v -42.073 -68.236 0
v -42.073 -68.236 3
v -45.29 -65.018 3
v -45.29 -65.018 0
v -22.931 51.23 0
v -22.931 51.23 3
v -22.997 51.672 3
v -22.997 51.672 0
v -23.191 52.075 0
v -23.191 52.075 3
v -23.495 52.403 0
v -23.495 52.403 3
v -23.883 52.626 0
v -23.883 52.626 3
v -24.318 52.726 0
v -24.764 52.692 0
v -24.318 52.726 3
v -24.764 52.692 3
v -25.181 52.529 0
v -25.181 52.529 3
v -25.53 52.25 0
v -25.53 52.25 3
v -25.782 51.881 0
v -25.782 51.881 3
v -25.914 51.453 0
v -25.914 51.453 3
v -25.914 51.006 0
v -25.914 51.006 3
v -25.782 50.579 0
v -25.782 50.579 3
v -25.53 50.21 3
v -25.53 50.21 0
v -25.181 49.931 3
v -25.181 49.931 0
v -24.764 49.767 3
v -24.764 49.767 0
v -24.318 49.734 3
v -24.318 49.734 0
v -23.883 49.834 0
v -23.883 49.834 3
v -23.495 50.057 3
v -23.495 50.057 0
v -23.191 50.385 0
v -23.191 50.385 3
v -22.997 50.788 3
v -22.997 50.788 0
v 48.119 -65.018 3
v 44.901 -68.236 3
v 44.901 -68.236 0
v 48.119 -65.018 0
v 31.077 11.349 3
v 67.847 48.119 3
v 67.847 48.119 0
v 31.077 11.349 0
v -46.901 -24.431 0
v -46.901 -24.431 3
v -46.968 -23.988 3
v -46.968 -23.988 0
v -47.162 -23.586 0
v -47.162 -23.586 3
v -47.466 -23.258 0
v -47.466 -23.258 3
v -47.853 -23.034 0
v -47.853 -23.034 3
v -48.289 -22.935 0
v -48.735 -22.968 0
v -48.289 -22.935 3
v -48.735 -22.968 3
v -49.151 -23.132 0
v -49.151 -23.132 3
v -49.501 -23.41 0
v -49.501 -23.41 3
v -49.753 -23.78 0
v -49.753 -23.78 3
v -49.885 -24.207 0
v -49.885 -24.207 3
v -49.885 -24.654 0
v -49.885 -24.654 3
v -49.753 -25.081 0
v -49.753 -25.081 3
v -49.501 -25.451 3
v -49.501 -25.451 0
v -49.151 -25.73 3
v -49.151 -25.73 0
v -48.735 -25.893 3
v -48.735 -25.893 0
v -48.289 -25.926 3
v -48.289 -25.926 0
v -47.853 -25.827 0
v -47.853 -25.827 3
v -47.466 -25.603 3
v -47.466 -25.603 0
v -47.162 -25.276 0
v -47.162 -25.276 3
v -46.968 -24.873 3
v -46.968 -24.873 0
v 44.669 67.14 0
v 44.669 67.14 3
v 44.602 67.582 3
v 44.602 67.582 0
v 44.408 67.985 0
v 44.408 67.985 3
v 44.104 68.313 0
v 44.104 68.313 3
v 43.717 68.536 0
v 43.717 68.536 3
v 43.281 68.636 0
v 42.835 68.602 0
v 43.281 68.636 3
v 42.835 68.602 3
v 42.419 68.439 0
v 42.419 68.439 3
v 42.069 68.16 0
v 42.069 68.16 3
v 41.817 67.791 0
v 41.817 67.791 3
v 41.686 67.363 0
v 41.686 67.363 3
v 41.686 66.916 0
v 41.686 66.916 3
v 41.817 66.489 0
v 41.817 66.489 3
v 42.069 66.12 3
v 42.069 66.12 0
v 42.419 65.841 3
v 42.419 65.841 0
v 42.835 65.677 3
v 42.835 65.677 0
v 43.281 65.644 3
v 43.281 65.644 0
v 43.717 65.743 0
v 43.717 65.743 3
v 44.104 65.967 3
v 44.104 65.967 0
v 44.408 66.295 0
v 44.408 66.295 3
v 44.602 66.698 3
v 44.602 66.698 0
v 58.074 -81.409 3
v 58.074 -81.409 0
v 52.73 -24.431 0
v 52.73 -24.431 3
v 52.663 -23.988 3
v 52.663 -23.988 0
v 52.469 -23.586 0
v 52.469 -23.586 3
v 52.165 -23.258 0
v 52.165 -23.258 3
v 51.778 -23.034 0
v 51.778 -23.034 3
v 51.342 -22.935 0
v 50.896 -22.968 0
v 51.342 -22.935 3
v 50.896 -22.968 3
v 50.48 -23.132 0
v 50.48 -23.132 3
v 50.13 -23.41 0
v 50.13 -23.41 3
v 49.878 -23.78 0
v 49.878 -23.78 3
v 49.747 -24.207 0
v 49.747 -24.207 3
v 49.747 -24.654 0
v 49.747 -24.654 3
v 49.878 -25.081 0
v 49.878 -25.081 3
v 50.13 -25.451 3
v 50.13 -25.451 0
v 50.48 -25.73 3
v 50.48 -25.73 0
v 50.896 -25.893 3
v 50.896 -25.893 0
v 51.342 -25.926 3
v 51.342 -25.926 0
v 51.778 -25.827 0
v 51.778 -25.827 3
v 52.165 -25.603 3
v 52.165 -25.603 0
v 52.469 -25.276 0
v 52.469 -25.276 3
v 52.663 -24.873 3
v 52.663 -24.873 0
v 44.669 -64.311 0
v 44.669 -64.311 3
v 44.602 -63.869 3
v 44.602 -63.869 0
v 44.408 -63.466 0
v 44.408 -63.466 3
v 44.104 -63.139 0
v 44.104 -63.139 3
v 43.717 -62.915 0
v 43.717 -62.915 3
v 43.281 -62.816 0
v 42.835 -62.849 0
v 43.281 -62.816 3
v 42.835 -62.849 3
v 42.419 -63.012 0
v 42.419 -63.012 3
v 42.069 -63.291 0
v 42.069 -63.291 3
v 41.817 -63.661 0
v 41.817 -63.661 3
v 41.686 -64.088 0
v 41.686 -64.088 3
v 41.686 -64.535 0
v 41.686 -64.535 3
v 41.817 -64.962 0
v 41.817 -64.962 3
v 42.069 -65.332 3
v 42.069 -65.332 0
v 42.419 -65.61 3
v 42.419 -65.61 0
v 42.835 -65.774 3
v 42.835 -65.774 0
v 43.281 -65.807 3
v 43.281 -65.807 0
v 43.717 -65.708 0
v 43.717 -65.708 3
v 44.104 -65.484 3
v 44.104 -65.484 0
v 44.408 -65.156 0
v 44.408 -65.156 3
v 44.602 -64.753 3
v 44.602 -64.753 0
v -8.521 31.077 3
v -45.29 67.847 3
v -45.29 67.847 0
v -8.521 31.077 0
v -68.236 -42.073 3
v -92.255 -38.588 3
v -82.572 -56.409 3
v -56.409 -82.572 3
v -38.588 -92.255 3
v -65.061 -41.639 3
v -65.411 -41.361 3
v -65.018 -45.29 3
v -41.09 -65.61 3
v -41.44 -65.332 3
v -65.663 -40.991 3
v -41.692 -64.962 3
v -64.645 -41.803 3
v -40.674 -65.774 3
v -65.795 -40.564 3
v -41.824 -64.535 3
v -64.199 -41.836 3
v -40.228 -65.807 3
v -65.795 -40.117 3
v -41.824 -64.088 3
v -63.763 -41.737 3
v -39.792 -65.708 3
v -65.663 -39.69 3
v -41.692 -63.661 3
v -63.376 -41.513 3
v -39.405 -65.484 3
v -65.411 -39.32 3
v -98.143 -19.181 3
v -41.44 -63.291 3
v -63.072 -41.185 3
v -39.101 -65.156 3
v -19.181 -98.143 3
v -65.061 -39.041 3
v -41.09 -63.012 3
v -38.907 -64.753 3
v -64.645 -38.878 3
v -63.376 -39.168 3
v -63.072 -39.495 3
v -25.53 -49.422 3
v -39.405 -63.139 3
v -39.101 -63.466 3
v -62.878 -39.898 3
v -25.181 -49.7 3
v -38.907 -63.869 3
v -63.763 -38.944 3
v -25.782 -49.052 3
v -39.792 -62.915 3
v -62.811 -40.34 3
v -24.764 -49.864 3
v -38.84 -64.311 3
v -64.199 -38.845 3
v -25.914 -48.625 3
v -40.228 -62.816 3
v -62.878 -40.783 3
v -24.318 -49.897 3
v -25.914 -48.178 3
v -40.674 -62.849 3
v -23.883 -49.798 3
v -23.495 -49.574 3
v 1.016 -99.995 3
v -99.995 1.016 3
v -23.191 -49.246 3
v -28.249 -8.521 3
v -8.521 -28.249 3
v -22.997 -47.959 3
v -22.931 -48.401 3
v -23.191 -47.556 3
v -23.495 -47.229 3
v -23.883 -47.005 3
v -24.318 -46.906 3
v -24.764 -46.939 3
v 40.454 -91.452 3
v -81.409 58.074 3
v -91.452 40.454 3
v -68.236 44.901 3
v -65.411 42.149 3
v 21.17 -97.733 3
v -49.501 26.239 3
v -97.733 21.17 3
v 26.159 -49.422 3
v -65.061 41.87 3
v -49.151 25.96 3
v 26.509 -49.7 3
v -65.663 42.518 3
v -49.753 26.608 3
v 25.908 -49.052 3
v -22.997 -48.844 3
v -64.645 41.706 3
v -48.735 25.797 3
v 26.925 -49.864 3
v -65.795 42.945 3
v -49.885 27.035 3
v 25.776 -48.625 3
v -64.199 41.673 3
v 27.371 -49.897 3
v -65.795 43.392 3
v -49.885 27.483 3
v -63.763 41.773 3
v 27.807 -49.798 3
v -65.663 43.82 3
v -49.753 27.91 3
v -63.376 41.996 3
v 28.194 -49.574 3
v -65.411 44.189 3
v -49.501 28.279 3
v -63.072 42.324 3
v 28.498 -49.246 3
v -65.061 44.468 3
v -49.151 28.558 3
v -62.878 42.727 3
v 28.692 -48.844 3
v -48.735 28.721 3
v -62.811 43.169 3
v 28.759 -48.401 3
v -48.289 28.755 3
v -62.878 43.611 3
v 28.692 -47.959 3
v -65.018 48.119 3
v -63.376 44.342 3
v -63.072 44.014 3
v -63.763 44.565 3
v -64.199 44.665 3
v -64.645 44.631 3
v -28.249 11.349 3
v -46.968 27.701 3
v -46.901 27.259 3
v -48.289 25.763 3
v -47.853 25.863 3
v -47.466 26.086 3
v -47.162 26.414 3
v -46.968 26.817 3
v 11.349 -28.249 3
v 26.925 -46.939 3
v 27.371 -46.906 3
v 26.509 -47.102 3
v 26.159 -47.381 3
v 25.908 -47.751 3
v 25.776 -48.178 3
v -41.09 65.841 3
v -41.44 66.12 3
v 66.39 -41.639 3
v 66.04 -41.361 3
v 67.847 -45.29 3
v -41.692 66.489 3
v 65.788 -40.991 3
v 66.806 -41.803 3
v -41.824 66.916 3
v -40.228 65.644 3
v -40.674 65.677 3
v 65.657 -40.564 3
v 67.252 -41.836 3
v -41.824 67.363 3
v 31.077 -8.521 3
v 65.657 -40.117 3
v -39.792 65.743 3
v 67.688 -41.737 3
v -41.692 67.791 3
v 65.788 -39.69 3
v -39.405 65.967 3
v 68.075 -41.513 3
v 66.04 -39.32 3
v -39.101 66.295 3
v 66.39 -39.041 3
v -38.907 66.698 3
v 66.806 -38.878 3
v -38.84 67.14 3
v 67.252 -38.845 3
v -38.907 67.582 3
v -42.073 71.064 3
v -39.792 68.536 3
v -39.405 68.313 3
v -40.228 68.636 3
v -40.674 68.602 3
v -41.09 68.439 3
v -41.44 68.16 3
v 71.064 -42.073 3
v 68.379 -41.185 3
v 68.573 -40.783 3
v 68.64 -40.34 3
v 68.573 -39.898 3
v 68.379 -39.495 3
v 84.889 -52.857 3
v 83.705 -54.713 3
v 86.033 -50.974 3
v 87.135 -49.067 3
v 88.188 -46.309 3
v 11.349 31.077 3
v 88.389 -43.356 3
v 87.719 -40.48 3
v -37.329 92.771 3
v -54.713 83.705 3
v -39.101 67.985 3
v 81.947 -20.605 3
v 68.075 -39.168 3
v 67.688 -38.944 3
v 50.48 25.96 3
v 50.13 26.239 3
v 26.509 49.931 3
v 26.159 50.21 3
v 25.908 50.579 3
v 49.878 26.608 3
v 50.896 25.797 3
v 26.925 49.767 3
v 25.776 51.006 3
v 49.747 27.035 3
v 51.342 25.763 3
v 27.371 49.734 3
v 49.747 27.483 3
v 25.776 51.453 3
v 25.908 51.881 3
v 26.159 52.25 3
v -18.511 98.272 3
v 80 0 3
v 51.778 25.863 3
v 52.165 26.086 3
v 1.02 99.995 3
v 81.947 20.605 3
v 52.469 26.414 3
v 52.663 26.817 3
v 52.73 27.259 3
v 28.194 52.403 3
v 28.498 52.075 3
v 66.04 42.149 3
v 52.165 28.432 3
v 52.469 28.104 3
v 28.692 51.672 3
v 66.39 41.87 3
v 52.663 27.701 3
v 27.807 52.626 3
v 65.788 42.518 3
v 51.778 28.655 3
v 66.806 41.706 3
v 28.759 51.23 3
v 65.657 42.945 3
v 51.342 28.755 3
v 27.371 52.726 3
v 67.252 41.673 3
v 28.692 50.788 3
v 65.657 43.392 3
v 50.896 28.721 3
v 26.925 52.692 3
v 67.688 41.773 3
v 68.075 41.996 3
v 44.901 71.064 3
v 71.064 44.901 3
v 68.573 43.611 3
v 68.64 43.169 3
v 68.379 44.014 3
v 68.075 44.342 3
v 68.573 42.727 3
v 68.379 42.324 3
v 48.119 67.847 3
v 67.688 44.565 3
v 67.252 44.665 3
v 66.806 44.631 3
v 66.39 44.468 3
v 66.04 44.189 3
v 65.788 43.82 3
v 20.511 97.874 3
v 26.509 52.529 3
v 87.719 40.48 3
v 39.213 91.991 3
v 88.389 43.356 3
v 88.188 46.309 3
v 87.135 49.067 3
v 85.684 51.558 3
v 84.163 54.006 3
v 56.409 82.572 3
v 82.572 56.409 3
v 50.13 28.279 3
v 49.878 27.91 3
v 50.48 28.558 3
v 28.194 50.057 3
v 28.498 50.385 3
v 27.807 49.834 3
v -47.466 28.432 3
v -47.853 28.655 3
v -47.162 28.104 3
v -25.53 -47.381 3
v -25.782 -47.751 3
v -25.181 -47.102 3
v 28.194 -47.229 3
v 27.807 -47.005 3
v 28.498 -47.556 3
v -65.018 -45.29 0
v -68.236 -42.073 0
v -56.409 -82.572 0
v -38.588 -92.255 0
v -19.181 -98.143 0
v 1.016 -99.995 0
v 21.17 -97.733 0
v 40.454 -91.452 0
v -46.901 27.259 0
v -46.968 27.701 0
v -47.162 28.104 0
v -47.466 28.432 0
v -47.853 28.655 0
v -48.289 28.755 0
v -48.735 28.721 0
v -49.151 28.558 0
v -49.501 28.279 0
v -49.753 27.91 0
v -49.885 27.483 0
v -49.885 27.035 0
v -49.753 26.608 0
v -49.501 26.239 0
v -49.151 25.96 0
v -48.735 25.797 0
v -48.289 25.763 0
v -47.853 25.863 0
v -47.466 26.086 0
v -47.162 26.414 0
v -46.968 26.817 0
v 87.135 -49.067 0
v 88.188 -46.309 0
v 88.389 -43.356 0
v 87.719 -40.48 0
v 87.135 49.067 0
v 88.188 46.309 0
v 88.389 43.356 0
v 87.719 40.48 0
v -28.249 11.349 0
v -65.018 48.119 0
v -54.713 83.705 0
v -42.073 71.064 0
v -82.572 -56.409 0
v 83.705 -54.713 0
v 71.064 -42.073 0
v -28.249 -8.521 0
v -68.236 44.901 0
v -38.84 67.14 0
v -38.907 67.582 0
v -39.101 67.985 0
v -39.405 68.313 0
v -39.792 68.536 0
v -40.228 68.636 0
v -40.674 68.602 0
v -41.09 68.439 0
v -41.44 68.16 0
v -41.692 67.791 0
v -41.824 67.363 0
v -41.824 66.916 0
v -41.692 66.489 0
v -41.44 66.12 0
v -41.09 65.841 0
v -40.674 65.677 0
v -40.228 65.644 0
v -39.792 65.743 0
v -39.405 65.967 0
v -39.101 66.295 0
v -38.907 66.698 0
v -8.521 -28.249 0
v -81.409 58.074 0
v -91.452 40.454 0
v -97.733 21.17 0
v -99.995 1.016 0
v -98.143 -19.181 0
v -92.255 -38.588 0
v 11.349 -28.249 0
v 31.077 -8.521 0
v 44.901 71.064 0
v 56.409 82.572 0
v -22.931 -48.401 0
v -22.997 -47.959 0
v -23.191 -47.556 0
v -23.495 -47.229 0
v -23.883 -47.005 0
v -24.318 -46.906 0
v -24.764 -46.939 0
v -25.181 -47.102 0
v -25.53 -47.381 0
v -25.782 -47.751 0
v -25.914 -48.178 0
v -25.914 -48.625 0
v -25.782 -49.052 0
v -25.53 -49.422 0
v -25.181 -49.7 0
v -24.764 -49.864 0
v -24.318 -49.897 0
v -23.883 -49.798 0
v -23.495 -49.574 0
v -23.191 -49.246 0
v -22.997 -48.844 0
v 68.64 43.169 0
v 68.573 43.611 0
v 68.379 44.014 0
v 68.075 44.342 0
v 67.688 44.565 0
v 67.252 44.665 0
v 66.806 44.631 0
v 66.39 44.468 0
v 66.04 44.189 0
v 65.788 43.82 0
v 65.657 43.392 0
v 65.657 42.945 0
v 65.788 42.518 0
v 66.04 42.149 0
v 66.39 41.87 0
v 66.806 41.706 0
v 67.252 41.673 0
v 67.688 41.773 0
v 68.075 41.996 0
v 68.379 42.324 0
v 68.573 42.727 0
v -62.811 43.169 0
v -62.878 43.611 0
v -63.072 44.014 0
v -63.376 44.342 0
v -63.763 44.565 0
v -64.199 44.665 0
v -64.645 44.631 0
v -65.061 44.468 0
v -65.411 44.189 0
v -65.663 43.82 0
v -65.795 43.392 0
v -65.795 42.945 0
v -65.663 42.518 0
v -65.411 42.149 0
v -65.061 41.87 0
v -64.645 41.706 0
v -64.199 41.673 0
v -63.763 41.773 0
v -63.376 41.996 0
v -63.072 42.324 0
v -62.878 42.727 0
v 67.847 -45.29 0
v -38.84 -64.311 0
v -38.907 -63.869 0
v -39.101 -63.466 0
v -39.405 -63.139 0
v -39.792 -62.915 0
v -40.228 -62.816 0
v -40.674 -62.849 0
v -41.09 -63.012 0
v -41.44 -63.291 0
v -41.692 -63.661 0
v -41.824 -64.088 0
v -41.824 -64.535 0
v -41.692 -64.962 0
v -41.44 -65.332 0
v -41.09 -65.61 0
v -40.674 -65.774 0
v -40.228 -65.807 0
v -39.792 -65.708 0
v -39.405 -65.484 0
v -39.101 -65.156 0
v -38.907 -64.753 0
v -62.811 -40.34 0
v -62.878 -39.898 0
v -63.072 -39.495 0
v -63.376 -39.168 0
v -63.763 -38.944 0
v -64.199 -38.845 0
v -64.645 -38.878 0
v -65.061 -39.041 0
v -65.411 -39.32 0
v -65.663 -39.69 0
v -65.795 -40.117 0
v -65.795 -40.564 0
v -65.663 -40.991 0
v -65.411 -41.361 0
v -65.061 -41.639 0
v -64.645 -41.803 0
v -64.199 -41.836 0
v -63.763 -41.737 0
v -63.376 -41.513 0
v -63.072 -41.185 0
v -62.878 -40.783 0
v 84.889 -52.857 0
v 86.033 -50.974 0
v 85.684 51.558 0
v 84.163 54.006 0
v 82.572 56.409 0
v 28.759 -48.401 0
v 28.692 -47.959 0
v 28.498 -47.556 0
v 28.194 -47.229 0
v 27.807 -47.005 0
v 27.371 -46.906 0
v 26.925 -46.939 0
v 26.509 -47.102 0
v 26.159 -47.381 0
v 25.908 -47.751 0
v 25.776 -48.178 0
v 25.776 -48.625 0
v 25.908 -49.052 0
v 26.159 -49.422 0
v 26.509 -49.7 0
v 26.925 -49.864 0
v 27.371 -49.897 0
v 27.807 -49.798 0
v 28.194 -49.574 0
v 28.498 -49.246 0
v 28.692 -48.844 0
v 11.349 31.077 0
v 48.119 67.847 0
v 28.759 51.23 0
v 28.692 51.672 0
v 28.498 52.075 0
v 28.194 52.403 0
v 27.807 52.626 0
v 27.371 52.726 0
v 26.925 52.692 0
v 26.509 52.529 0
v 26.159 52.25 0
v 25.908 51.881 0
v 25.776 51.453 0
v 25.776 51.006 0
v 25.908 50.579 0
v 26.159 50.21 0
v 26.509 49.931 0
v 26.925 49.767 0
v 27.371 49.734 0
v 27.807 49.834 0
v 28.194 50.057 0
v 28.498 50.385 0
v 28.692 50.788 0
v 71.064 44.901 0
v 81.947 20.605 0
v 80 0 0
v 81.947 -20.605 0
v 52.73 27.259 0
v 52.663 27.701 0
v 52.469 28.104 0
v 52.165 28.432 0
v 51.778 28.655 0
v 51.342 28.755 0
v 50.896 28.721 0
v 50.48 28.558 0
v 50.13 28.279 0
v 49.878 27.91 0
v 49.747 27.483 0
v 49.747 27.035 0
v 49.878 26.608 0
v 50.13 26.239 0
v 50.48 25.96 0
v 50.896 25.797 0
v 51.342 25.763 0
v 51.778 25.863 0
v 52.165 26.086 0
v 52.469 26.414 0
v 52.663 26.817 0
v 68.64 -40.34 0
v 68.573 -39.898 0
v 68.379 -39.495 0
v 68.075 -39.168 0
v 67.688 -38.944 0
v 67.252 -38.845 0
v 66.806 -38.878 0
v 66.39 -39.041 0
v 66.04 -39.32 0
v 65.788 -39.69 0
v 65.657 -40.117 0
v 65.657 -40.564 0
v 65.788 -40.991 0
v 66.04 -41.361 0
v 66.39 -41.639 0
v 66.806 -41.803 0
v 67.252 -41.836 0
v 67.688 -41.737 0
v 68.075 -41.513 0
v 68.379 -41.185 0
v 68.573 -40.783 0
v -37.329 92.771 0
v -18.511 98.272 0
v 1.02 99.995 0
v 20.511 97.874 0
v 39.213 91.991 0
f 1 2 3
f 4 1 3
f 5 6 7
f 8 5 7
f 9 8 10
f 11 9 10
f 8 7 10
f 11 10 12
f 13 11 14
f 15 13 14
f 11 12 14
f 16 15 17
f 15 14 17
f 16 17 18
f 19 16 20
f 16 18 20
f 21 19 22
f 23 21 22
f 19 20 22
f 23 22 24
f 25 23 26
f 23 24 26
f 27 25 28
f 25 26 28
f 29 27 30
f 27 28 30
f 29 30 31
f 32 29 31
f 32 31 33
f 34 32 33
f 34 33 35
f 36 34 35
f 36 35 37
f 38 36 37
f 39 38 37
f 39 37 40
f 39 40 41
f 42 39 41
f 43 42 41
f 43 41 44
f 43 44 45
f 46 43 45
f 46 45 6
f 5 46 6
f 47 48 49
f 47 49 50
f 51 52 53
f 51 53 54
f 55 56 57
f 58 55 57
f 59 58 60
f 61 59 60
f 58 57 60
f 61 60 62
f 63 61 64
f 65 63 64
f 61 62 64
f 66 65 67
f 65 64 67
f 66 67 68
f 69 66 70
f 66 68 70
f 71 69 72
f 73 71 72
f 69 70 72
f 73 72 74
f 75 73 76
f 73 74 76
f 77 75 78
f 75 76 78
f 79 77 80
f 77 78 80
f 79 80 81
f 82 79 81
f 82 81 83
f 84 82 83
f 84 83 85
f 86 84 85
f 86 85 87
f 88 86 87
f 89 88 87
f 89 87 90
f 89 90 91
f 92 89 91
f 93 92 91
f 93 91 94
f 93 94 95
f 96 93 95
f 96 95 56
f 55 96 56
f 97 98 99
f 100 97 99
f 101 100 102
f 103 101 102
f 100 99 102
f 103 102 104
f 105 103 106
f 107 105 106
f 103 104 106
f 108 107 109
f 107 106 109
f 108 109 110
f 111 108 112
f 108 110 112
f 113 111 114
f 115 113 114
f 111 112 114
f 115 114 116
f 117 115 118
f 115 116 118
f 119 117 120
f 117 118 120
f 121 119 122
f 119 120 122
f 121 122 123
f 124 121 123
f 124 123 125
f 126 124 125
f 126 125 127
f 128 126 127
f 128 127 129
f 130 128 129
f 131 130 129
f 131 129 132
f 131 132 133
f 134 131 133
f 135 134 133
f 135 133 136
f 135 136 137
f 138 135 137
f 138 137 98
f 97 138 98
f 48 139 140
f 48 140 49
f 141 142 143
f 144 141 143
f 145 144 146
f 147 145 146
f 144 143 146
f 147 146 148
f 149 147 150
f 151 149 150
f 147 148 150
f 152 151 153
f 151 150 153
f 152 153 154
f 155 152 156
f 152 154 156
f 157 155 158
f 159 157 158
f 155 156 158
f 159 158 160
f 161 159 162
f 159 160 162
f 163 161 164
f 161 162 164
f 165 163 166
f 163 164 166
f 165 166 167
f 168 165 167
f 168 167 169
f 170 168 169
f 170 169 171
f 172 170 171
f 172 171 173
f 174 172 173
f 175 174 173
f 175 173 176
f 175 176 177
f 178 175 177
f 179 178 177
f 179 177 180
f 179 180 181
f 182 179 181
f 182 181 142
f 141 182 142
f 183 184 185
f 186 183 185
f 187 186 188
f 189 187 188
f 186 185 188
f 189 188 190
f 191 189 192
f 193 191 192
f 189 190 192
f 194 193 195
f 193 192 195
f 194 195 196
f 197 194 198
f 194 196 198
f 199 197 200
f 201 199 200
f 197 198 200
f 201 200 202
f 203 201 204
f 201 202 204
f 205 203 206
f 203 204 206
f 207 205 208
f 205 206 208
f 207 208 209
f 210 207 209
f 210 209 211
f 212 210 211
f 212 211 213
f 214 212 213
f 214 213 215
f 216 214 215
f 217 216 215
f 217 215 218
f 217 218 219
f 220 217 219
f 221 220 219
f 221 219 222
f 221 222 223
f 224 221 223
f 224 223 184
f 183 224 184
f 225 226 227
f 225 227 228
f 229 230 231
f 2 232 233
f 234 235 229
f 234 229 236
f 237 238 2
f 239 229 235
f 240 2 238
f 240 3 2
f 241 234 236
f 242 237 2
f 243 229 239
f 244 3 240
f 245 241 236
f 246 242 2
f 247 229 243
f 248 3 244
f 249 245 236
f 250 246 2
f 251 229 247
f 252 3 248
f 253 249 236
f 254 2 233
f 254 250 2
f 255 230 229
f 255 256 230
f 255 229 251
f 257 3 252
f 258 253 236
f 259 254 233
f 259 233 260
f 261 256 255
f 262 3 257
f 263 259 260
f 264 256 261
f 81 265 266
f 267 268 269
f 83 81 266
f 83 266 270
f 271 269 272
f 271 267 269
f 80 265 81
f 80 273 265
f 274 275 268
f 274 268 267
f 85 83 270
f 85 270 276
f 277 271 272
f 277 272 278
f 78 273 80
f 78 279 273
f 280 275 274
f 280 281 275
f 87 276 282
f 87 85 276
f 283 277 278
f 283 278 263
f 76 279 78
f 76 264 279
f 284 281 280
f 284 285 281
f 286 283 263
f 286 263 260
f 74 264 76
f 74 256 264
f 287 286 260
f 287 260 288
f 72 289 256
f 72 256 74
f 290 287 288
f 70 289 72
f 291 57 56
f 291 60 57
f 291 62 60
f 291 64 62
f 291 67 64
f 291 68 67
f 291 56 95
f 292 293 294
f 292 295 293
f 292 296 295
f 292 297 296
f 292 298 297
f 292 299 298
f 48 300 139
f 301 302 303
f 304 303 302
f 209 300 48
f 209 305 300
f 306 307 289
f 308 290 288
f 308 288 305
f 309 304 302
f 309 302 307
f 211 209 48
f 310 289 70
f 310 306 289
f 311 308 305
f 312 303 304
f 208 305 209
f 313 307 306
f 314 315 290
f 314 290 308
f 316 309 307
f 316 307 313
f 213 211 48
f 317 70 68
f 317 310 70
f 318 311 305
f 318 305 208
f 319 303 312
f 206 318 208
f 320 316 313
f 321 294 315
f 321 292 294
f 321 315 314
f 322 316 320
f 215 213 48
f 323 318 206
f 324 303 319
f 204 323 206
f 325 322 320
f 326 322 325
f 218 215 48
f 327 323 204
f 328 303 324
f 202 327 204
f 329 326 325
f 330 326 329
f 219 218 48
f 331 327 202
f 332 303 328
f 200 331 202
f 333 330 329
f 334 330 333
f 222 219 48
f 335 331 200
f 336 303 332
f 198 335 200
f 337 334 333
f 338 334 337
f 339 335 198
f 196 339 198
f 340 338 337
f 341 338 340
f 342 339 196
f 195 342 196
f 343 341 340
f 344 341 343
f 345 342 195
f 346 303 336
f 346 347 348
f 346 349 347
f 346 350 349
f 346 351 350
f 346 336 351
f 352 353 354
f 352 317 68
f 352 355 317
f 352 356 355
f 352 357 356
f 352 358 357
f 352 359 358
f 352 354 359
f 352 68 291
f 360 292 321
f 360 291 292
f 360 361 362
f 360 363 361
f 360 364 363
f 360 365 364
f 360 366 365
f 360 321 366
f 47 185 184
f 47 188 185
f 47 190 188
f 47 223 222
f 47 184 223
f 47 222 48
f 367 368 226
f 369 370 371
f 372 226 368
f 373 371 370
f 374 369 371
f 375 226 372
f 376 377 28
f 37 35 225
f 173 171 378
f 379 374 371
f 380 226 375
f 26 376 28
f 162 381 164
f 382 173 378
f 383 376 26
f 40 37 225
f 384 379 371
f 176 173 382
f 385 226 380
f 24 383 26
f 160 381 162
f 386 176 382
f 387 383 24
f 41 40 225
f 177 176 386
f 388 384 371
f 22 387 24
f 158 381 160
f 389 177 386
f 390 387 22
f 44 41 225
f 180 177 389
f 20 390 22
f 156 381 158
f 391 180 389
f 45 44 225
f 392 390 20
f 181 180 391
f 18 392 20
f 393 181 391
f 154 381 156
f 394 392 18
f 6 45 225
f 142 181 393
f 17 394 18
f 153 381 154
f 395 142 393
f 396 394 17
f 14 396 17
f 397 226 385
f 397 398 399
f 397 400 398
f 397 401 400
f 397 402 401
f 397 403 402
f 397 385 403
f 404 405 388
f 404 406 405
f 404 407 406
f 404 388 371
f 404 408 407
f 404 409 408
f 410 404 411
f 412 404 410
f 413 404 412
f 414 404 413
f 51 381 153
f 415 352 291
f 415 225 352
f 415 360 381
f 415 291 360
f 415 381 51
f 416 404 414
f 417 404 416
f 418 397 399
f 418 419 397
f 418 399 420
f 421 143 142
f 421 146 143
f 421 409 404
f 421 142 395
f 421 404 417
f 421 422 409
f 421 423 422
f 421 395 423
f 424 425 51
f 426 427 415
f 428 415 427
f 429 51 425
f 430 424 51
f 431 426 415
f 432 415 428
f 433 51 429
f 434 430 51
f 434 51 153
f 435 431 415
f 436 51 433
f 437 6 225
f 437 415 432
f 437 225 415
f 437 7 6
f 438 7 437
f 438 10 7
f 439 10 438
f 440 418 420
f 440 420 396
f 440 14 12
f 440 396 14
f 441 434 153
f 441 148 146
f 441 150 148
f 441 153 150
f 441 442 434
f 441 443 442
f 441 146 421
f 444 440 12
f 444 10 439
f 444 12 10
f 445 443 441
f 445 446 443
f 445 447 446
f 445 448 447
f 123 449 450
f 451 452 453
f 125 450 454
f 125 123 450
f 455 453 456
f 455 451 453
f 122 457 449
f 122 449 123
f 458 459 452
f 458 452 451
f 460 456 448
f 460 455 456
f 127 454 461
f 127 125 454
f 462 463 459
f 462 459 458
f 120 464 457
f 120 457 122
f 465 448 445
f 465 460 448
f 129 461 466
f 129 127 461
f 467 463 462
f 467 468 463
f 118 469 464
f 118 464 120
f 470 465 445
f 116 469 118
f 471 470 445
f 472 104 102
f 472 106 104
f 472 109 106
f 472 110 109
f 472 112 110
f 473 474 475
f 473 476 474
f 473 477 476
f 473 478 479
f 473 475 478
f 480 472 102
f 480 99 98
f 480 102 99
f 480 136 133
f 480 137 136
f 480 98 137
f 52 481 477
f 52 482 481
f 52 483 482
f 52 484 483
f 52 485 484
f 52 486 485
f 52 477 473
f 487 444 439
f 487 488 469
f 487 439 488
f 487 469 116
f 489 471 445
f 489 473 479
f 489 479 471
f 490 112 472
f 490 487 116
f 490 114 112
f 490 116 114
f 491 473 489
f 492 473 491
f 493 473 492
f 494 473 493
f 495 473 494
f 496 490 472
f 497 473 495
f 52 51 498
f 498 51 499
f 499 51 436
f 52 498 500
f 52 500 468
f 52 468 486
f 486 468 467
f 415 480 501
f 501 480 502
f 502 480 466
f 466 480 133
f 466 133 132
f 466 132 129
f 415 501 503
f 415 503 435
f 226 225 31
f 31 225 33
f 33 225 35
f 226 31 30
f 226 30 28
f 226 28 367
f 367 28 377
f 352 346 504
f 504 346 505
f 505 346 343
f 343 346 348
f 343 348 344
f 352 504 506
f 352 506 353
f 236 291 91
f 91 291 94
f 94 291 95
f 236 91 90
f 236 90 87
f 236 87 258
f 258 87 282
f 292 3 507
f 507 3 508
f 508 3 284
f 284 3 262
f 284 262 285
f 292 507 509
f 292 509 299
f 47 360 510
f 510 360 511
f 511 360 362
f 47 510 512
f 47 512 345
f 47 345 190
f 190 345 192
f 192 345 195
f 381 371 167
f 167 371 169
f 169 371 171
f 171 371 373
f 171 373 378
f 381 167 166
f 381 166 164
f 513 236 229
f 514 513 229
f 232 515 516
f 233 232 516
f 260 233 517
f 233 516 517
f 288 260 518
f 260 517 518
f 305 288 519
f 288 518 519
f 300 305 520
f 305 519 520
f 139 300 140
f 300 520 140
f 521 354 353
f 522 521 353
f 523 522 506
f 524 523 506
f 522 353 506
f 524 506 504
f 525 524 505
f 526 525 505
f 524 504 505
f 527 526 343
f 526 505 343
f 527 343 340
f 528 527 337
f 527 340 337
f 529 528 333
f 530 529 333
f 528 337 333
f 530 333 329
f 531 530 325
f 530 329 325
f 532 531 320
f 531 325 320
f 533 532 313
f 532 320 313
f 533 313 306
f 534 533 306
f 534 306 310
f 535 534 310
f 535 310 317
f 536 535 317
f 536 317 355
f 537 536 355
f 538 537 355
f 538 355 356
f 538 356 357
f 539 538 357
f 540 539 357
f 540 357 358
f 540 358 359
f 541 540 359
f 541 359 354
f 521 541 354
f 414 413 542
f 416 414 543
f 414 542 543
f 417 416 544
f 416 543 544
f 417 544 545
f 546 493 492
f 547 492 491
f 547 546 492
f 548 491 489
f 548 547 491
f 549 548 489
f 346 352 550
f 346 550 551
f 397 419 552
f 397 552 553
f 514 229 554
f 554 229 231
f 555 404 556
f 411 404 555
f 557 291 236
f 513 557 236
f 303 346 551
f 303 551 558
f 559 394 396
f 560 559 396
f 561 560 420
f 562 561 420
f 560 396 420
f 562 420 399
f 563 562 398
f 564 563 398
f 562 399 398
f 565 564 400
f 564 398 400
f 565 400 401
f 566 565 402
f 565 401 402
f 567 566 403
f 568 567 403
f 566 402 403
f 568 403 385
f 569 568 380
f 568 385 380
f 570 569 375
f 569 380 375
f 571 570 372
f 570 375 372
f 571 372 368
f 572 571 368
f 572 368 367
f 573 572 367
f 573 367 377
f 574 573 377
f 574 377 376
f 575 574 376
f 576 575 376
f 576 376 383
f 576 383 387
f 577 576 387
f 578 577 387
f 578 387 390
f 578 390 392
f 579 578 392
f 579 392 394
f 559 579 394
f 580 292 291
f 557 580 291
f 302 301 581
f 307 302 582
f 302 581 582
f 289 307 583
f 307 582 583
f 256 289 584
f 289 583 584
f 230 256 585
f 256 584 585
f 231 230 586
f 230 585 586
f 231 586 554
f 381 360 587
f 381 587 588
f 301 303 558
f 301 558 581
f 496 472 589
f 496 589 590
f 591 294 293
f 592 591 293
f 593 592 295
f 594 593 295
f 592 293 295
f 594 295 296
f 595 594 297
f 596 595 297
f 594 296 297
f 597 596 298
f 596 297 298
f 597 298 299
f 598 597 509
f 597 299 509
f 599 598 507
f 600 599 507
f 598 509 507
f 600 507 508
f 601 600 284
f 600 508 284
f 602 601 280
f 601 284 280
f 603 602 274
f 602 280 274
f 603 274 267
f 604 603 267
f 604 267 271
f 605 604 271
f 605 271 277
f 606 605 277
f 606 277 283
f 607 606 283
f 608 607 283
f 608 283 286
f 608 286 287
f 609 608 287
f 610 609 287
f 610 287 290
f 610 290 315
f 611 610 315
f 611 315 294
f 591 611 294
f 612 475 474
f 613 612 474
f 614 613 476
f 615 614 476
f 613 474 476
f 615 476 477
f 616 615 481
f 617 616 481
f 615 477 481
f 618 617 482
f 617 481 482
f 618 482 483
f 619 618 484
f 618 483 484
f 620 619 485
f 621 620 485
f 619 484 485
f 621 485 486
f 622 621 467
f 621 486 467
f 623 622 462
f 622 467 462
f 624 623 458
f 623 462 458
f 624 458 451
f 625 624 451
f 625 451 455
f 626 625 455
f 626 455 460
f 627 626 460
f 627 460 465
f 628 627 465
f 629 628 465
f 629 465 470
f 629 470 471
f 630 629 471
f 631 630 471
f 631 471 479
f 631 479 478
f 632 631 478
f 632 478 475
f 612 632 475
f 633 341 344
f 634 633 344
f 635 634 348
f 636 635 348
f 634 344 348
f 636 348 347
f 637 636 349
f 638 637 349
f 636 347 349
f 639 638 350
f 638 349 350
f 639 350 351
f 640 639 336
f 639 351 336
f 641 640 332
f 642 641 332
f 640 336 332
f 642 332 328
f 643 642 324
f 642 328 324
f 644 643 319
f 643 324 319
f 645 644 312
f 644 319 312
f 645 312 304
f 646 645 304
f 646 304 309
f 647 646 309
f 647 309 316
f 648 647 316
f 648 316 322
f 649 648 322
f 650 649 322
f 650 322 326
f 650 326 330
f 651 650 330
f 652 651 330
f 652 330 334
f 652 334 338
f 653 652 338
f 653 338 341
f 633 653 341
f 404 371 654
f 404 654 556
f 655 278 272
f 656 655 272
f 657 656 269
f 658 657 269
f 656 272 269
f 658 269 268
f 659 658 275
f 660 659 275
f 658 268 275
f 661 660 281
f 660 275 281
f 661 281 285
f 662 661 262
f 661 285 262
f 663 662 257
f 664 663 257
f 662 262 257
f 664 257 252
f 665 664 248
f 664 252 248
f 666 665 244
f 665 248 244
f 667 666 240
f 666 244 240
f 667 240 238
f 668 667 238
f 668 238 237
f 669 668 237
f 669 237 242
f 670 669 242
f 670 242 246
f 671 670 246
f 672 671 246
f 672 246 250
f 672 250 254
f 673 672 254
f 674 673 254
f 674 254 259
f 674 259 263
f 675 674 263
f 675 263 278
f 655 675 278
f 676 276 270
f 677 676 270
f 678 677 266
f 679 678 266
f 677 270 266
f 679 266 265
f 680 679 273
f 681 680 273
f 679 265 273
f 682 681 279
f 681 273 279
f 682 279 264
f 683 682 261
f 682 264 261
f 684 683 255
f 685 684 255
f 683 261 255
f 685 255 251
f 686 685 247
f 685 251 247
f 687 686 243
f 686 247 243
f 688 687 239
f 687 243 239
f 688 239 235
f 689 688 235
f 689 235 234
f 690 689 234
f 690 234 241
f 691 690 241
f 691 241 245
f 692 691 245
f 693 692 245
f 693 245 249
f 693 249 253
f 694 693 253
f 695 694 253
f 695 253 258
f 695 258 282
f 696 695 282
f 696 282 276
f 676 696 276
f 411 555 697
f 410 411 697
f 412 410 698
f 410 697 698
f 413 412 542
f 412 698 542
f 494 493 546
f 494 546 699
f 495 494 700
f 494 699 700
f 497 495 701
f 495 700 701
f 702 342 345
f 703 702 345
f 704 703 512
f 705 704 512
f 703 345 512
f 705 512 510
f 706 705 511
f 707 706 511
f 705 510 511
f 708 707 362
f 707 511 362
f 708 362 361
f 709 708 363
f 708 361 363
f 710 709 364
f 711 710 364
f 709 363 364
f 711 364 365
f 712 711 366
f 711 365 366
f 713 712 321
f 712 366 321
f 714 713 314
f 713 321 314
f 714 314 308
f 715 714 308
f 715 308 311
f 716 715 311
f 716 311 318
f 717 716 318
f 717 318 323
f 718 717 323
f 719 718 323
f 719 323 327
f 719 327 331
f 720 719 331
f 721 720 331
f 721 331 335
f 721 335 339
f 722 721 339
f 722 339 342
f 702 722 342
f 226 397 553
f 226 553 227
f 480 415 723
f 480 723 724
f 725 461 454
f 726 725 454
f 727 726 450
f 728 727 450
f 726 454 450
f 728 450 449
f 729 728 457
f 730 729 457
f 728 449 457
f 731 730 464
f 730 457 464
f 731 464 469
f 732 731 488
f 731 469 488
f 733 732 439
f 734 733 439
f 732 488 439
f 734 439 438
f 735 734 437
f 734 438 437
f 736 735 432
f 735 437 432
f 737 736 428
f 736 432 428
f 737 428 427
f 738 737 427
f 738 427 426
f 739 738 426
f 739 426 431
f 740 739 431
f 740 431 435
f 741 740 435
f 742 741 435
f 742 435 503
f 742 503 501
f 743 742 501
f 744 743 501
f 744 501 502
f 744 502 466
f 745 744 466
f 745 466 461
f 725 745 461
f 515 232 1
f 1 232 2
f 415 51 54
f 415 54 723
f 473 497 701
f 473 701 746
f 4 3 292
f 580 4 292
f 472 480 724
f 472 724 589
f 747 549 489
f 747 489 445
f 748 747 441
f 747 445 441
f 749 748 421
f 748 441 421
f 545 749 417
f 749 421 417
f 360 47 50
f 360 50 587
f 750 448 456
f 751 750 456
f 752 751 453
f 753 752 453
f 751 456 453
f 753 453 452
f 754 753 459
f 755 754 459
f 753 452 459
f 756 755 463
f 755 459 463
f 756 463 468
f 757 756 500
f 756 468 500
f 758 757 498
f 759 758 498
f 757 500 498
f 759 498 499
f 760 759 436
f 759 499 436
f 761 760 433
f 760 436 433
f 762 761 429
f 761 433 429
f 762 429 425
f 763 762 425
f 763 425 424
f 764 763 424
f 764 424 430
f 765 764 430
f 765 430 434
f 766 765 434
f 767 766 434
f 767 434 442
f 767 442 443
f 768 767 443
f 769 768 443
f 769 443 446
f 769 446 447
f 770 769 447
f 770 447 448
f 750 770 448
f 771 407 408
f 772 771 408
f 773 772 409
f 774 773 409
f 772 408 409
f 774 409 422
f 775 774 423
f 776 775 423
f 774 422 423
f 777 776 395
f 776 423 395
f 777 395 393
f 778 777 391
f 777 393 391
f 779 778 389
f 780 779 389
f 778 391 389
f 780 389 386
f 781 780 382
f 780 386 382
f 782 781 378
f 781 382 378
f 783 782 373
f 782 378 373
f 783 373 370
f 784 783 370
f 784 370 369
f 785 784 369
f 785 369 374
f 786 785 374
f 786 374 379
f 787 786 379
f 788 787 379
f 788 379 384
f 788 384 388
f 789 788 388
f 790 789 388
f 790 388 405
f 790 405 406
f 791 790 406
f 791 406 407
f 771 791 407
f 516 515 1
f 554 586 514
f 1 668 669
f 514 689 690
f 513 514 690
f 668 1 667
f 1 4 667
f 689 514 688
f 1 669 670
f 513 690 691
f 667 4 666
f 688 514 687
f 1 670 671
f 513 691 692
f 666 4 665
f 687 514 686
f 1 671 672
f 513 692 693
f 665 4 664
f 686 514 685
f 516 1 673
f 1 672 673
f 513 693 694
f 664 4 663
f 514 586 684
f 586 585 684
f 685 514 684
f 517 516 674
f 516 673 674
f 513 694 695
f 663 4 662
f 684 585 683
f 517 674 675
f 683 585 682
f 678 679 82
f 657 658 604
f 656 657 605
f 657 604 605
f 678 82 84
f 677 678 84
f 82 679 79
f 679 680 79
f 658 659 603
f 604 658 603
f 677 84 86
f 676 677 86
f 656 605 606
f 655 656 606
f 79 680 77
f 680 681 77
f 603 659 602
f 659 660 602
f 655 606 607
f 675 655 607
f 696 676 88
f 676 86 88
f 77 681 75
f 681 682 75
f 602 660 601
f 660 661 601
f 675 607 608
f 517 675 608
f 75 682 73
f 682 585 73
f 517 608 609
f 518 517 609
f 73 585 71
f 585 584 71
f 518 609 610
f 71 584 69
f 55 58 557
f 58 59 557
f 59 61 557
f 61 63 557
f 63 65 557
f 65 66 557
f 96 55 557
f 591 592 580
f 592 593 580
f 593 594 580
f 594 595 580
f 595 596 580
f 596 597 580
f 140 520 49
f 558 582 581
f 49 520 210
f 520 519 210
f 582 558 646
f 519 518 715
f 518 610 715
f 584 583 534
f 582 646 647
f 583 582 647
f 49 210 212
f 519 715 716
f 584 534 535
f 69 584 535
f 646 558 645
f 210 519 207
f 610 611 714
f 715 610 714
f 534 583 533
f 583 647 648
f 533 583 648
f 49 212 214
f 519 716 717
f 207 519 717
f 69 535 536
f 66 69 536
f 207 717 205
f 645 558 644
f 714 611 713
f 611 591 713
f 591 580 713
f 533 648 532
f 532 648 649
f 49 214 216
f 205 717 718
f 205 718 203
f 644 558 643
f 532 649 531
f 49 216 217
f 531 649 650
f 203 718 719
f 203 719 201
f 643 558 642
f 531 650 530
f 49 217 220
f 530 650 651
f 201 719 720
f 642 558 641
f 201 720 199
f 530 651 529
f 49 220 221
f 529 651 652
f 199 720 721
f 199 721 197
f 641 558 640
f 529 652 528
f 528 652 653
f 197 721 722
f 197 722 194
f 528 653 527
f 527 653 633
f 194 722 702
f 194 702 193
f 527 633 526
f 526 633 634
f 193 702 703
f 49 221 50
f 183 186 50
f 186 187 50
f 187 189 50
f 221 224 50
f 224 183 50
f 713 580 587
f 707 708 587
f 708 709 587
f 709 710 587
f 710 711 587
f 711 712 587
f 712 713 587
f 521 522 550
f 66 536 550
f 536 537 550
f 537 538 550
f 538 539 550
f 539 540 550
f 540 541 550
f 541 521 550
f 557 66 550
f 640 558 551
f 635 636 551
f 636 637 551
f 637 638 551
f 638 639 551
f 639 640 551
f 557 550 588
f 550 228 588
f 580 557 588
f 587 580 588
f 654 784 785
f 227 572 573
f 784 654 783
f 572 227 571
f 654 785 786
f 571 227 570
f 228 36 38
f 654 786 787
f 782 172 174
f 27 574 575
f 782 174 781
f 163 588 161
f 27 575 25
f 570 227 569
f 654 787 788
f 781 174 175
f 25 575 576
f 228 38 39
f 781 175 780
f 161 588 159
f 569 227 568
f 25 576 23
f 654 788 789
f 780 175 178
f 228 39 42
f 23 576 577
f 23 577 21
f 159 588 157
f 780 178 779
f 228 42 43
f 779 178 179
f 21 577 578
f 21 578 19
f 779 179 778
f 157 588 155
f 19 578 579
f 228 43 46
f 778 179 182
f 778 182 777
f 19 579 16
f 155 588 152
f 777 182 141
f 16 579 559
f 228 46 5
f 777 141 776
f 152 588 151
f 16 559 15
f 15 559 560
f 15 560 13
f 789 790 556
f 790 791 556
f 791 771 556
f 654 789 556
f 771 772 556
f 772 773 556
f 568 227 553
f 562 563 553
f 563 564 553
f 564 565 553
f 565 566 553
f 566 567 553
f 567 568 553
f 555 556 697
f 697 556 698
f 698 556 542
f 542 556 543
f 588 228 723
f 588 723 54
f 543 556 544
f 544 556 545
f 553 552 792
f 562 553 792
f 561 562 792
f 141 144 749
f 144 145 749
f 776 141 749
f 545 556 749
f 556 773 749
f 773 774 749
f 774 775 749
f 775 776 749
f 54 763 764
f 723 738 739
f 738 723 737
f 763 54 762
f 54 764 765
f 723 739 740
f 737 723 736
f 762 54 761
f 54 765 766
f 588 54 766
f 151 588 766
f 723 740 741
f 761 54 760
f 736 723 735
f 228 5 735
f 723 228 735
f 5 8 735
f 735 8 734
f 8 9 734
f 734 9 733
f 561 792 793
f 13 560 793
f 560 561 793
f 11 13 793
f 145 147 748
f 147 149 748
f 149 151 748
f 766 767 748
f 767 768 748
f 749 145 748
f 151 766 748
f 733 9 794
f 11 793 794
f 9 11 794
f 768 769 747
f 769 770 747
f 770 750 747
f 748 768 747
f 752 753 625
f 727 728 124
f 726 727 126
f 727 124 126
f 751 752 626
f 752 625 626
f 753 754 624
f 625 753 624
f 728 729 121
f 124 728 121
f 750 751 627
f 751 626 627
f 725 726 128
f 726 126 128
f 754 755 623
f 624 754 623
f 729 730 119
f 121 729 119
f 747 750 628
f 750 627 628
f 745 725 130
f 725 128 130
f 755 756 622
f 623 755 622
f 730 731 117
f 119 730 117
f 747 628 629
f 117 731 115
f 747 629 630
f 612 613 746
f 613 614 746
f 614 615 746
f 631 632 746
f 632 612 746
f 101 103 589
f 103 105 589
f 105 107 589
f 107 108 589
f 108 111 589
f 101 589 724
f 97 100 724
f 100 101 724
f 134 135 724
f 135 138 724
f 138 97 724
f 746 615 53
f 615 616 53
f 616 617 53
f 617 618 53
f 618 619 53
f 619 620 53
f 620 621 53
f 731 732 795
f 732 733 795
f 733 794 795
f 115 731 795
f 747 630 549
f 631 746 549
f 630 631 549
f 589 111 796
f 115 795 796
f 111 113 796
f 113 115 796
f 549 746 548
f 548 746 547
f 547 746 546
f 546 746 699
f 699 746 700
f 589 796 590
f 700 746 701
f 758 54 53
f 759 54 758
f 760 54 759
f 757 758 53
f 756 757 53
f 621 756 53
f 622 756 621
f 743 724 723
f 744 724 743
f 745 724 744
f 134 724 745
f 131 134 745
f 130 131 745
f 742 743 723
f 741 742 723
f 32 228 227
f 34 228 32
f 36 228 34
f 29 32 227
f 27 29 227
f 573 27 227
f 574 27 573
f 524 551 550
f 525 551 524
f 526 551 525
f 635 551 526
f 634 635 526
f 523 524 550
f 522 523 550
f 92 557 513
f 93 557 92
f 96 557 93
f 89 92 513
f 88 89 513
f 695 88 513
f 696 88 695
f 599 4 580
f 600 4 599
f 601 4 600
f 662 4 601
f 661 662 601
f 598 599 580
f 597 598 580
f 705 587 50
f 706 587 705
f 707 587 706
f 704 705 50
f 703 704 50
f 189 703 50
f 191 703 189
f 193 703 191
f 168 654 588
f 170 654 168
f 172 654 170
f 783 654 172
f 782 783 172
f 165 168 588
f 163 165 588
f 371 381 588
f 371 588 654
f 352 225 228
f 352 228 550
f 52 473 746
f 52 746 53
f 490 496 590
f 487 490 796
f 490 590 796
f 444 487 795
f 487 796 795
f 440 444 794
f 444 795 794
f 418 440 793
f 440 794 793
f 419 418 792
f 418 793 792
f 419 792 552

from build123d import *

# Parameters (mm, degrees)
CROQUIS1_R              = 100
SALIENTE_EXTRUIR1_DEPTH = 3
CROQUIS3_R              = 110
CORTAR_EXTRUIR1_DEPTH   = 3
REDONDEO1_R             = 10
CORTAR_EXTRUIR2_DEPTH   = 142.453172607
CROQUIS5_R              = 1.5
CORTAR_EXTRUIR3_DEPTH   = 10


with BuildPart() as part:
    # Croquis1 → Saliente-Extruir1 (new body)
    with BuildSketch(Plane.XY):
        Circle(CROQUIS1_R)
    extrude(amount=SALIENTE_EXTRUIR1_DEPTH)

    # Croquis3 → Cortar-Extruir1 (cut)
    with BuildSketch(Plane.XY.offset(3)):
        with Locations((190, 0)):
            Circle(CROQUIS3_R)
    extrude(amount=-CORTAR_EXTRUIR1_DEPTH, mode=Mode.SUBTRACT)

    # Redondeo1
    redondeo1_edges = [part.edges().sort_by_distance(p)[0] for p in [
        (89.473684211, -44.659375654, 1.5),
        (89.473684211, 44.659375654, 1.5),
    ]]
    fillet(redondeo1_edges, radius=REDONDEO1_R)

    # Croquis4 → Cortar-Extruir2 (cut, through all)
    with BuildSketch(Plane.XY.offset(3)):
        Polygon((-83.792153571, -57.629202667), (-57.629202667, -83.792153571), (-42.072853481, -68.235804385), (-45.290189335, -65.01846853), (-8.520636713, -28.248915908), (-28.248915908, -8.520636713), (-65.01846853, -45.290189335), (-68.235804385, -42.072853481), align=None)
        Polygon((-8.520636713, 31.077343033), (-28.248915908, 11.349063838), (-65.01846853, 48.11861646), (-68.235804385, 44.901280605), (-83.792153571, 60.457629791), (-57.629202667, 86.620580695), (-42.072853481, 71.064231509), (-45.290189335, 67.846895655), align=None)
        Polygon((31.077343033, 11.349063838), (11.349063838, 31.077343033), (48.11861646, 67.846895655), (44.901280605, 71.064231509), (60.457629791, 86.620580695), (86.620580695, 60.457629791), (71.064231509, 44.901280605), (67.846895655, 48.11861646), align=None)
        Polygon((11.349063838, -28.248915908), (31.077343033, -8.520636713), (67.846895655, -45.290189335), (71.064231509, -42.072853481), (86.620580695, -57.629202667), (60.457629791, -83.792153571), (44.901280605, -68.235804385), (48.11861646, -65.01846853), align=None)
    extrude(amount=-CORTAR_EXTRUIR2_DEPTH, mode=Mode.SUBTRACT)

    # Croquis5 → Cortar-Extruir3 (cut)
    with BuildSketch(Plane.XY.offset(3)):
        with Locations((-64.311361749, -40.340441867)):
            Circle(CROQUIS5_R)
        with Locations((-48.401459172, -24.43053929)):
            Circle(CROQUIS5_R)
        with Locations((-24.43053929, -48.401459172)):
            Circle(CROQUIS5_R)
        with Locations((-40.340441867, -64.311361749)):
            Circle(CROQUIS5_R)
        with Locations((-24.43053929, 51.229886297)):
            Circle(CROQUIS5_R)
        with Locations((-40.340441867, 67.139788874)):
            Circle(CROQUIS5_R)
        with Locations((-48.401459172, 27.258966415)):
            Circle(CROQUIS5_R)
        with Locations((-64.311361749, 43.168868991)):
            Circle(CROQUIS5_R)
        with Locations((51.229886297, 27.258966415)):
            Circle(CROQUIS5_R)
        with Locations((67.139788874, 43.168868991)):
            Circle(CROQUIS5_R)
        with Locations((27.258966415, 51.229886297)):
            Circle(CROQUIS5_R)
        with Locations((43.168868991, 67.139788874)):
            Circle(CROQUIS5_R)
        with Locations((27.258966415, -48.401459172)):
            Circle(CROQUIS5_R)
        with Locations((43.168868991, -64.311361749)):
            Circle(CROQUIS5_R)
        with Locations((51.229886297, -24.43053929)):
            Circle(CROQUIS5_R)
        with Locations((67.139788874, -40.340441867)):
            Circle(CROQUIS5_R)
    extrude(amount=-CORTAR_EXTRUIR3_DEPTH, mode=Mode.SUBTRACT)


solid = part.part
